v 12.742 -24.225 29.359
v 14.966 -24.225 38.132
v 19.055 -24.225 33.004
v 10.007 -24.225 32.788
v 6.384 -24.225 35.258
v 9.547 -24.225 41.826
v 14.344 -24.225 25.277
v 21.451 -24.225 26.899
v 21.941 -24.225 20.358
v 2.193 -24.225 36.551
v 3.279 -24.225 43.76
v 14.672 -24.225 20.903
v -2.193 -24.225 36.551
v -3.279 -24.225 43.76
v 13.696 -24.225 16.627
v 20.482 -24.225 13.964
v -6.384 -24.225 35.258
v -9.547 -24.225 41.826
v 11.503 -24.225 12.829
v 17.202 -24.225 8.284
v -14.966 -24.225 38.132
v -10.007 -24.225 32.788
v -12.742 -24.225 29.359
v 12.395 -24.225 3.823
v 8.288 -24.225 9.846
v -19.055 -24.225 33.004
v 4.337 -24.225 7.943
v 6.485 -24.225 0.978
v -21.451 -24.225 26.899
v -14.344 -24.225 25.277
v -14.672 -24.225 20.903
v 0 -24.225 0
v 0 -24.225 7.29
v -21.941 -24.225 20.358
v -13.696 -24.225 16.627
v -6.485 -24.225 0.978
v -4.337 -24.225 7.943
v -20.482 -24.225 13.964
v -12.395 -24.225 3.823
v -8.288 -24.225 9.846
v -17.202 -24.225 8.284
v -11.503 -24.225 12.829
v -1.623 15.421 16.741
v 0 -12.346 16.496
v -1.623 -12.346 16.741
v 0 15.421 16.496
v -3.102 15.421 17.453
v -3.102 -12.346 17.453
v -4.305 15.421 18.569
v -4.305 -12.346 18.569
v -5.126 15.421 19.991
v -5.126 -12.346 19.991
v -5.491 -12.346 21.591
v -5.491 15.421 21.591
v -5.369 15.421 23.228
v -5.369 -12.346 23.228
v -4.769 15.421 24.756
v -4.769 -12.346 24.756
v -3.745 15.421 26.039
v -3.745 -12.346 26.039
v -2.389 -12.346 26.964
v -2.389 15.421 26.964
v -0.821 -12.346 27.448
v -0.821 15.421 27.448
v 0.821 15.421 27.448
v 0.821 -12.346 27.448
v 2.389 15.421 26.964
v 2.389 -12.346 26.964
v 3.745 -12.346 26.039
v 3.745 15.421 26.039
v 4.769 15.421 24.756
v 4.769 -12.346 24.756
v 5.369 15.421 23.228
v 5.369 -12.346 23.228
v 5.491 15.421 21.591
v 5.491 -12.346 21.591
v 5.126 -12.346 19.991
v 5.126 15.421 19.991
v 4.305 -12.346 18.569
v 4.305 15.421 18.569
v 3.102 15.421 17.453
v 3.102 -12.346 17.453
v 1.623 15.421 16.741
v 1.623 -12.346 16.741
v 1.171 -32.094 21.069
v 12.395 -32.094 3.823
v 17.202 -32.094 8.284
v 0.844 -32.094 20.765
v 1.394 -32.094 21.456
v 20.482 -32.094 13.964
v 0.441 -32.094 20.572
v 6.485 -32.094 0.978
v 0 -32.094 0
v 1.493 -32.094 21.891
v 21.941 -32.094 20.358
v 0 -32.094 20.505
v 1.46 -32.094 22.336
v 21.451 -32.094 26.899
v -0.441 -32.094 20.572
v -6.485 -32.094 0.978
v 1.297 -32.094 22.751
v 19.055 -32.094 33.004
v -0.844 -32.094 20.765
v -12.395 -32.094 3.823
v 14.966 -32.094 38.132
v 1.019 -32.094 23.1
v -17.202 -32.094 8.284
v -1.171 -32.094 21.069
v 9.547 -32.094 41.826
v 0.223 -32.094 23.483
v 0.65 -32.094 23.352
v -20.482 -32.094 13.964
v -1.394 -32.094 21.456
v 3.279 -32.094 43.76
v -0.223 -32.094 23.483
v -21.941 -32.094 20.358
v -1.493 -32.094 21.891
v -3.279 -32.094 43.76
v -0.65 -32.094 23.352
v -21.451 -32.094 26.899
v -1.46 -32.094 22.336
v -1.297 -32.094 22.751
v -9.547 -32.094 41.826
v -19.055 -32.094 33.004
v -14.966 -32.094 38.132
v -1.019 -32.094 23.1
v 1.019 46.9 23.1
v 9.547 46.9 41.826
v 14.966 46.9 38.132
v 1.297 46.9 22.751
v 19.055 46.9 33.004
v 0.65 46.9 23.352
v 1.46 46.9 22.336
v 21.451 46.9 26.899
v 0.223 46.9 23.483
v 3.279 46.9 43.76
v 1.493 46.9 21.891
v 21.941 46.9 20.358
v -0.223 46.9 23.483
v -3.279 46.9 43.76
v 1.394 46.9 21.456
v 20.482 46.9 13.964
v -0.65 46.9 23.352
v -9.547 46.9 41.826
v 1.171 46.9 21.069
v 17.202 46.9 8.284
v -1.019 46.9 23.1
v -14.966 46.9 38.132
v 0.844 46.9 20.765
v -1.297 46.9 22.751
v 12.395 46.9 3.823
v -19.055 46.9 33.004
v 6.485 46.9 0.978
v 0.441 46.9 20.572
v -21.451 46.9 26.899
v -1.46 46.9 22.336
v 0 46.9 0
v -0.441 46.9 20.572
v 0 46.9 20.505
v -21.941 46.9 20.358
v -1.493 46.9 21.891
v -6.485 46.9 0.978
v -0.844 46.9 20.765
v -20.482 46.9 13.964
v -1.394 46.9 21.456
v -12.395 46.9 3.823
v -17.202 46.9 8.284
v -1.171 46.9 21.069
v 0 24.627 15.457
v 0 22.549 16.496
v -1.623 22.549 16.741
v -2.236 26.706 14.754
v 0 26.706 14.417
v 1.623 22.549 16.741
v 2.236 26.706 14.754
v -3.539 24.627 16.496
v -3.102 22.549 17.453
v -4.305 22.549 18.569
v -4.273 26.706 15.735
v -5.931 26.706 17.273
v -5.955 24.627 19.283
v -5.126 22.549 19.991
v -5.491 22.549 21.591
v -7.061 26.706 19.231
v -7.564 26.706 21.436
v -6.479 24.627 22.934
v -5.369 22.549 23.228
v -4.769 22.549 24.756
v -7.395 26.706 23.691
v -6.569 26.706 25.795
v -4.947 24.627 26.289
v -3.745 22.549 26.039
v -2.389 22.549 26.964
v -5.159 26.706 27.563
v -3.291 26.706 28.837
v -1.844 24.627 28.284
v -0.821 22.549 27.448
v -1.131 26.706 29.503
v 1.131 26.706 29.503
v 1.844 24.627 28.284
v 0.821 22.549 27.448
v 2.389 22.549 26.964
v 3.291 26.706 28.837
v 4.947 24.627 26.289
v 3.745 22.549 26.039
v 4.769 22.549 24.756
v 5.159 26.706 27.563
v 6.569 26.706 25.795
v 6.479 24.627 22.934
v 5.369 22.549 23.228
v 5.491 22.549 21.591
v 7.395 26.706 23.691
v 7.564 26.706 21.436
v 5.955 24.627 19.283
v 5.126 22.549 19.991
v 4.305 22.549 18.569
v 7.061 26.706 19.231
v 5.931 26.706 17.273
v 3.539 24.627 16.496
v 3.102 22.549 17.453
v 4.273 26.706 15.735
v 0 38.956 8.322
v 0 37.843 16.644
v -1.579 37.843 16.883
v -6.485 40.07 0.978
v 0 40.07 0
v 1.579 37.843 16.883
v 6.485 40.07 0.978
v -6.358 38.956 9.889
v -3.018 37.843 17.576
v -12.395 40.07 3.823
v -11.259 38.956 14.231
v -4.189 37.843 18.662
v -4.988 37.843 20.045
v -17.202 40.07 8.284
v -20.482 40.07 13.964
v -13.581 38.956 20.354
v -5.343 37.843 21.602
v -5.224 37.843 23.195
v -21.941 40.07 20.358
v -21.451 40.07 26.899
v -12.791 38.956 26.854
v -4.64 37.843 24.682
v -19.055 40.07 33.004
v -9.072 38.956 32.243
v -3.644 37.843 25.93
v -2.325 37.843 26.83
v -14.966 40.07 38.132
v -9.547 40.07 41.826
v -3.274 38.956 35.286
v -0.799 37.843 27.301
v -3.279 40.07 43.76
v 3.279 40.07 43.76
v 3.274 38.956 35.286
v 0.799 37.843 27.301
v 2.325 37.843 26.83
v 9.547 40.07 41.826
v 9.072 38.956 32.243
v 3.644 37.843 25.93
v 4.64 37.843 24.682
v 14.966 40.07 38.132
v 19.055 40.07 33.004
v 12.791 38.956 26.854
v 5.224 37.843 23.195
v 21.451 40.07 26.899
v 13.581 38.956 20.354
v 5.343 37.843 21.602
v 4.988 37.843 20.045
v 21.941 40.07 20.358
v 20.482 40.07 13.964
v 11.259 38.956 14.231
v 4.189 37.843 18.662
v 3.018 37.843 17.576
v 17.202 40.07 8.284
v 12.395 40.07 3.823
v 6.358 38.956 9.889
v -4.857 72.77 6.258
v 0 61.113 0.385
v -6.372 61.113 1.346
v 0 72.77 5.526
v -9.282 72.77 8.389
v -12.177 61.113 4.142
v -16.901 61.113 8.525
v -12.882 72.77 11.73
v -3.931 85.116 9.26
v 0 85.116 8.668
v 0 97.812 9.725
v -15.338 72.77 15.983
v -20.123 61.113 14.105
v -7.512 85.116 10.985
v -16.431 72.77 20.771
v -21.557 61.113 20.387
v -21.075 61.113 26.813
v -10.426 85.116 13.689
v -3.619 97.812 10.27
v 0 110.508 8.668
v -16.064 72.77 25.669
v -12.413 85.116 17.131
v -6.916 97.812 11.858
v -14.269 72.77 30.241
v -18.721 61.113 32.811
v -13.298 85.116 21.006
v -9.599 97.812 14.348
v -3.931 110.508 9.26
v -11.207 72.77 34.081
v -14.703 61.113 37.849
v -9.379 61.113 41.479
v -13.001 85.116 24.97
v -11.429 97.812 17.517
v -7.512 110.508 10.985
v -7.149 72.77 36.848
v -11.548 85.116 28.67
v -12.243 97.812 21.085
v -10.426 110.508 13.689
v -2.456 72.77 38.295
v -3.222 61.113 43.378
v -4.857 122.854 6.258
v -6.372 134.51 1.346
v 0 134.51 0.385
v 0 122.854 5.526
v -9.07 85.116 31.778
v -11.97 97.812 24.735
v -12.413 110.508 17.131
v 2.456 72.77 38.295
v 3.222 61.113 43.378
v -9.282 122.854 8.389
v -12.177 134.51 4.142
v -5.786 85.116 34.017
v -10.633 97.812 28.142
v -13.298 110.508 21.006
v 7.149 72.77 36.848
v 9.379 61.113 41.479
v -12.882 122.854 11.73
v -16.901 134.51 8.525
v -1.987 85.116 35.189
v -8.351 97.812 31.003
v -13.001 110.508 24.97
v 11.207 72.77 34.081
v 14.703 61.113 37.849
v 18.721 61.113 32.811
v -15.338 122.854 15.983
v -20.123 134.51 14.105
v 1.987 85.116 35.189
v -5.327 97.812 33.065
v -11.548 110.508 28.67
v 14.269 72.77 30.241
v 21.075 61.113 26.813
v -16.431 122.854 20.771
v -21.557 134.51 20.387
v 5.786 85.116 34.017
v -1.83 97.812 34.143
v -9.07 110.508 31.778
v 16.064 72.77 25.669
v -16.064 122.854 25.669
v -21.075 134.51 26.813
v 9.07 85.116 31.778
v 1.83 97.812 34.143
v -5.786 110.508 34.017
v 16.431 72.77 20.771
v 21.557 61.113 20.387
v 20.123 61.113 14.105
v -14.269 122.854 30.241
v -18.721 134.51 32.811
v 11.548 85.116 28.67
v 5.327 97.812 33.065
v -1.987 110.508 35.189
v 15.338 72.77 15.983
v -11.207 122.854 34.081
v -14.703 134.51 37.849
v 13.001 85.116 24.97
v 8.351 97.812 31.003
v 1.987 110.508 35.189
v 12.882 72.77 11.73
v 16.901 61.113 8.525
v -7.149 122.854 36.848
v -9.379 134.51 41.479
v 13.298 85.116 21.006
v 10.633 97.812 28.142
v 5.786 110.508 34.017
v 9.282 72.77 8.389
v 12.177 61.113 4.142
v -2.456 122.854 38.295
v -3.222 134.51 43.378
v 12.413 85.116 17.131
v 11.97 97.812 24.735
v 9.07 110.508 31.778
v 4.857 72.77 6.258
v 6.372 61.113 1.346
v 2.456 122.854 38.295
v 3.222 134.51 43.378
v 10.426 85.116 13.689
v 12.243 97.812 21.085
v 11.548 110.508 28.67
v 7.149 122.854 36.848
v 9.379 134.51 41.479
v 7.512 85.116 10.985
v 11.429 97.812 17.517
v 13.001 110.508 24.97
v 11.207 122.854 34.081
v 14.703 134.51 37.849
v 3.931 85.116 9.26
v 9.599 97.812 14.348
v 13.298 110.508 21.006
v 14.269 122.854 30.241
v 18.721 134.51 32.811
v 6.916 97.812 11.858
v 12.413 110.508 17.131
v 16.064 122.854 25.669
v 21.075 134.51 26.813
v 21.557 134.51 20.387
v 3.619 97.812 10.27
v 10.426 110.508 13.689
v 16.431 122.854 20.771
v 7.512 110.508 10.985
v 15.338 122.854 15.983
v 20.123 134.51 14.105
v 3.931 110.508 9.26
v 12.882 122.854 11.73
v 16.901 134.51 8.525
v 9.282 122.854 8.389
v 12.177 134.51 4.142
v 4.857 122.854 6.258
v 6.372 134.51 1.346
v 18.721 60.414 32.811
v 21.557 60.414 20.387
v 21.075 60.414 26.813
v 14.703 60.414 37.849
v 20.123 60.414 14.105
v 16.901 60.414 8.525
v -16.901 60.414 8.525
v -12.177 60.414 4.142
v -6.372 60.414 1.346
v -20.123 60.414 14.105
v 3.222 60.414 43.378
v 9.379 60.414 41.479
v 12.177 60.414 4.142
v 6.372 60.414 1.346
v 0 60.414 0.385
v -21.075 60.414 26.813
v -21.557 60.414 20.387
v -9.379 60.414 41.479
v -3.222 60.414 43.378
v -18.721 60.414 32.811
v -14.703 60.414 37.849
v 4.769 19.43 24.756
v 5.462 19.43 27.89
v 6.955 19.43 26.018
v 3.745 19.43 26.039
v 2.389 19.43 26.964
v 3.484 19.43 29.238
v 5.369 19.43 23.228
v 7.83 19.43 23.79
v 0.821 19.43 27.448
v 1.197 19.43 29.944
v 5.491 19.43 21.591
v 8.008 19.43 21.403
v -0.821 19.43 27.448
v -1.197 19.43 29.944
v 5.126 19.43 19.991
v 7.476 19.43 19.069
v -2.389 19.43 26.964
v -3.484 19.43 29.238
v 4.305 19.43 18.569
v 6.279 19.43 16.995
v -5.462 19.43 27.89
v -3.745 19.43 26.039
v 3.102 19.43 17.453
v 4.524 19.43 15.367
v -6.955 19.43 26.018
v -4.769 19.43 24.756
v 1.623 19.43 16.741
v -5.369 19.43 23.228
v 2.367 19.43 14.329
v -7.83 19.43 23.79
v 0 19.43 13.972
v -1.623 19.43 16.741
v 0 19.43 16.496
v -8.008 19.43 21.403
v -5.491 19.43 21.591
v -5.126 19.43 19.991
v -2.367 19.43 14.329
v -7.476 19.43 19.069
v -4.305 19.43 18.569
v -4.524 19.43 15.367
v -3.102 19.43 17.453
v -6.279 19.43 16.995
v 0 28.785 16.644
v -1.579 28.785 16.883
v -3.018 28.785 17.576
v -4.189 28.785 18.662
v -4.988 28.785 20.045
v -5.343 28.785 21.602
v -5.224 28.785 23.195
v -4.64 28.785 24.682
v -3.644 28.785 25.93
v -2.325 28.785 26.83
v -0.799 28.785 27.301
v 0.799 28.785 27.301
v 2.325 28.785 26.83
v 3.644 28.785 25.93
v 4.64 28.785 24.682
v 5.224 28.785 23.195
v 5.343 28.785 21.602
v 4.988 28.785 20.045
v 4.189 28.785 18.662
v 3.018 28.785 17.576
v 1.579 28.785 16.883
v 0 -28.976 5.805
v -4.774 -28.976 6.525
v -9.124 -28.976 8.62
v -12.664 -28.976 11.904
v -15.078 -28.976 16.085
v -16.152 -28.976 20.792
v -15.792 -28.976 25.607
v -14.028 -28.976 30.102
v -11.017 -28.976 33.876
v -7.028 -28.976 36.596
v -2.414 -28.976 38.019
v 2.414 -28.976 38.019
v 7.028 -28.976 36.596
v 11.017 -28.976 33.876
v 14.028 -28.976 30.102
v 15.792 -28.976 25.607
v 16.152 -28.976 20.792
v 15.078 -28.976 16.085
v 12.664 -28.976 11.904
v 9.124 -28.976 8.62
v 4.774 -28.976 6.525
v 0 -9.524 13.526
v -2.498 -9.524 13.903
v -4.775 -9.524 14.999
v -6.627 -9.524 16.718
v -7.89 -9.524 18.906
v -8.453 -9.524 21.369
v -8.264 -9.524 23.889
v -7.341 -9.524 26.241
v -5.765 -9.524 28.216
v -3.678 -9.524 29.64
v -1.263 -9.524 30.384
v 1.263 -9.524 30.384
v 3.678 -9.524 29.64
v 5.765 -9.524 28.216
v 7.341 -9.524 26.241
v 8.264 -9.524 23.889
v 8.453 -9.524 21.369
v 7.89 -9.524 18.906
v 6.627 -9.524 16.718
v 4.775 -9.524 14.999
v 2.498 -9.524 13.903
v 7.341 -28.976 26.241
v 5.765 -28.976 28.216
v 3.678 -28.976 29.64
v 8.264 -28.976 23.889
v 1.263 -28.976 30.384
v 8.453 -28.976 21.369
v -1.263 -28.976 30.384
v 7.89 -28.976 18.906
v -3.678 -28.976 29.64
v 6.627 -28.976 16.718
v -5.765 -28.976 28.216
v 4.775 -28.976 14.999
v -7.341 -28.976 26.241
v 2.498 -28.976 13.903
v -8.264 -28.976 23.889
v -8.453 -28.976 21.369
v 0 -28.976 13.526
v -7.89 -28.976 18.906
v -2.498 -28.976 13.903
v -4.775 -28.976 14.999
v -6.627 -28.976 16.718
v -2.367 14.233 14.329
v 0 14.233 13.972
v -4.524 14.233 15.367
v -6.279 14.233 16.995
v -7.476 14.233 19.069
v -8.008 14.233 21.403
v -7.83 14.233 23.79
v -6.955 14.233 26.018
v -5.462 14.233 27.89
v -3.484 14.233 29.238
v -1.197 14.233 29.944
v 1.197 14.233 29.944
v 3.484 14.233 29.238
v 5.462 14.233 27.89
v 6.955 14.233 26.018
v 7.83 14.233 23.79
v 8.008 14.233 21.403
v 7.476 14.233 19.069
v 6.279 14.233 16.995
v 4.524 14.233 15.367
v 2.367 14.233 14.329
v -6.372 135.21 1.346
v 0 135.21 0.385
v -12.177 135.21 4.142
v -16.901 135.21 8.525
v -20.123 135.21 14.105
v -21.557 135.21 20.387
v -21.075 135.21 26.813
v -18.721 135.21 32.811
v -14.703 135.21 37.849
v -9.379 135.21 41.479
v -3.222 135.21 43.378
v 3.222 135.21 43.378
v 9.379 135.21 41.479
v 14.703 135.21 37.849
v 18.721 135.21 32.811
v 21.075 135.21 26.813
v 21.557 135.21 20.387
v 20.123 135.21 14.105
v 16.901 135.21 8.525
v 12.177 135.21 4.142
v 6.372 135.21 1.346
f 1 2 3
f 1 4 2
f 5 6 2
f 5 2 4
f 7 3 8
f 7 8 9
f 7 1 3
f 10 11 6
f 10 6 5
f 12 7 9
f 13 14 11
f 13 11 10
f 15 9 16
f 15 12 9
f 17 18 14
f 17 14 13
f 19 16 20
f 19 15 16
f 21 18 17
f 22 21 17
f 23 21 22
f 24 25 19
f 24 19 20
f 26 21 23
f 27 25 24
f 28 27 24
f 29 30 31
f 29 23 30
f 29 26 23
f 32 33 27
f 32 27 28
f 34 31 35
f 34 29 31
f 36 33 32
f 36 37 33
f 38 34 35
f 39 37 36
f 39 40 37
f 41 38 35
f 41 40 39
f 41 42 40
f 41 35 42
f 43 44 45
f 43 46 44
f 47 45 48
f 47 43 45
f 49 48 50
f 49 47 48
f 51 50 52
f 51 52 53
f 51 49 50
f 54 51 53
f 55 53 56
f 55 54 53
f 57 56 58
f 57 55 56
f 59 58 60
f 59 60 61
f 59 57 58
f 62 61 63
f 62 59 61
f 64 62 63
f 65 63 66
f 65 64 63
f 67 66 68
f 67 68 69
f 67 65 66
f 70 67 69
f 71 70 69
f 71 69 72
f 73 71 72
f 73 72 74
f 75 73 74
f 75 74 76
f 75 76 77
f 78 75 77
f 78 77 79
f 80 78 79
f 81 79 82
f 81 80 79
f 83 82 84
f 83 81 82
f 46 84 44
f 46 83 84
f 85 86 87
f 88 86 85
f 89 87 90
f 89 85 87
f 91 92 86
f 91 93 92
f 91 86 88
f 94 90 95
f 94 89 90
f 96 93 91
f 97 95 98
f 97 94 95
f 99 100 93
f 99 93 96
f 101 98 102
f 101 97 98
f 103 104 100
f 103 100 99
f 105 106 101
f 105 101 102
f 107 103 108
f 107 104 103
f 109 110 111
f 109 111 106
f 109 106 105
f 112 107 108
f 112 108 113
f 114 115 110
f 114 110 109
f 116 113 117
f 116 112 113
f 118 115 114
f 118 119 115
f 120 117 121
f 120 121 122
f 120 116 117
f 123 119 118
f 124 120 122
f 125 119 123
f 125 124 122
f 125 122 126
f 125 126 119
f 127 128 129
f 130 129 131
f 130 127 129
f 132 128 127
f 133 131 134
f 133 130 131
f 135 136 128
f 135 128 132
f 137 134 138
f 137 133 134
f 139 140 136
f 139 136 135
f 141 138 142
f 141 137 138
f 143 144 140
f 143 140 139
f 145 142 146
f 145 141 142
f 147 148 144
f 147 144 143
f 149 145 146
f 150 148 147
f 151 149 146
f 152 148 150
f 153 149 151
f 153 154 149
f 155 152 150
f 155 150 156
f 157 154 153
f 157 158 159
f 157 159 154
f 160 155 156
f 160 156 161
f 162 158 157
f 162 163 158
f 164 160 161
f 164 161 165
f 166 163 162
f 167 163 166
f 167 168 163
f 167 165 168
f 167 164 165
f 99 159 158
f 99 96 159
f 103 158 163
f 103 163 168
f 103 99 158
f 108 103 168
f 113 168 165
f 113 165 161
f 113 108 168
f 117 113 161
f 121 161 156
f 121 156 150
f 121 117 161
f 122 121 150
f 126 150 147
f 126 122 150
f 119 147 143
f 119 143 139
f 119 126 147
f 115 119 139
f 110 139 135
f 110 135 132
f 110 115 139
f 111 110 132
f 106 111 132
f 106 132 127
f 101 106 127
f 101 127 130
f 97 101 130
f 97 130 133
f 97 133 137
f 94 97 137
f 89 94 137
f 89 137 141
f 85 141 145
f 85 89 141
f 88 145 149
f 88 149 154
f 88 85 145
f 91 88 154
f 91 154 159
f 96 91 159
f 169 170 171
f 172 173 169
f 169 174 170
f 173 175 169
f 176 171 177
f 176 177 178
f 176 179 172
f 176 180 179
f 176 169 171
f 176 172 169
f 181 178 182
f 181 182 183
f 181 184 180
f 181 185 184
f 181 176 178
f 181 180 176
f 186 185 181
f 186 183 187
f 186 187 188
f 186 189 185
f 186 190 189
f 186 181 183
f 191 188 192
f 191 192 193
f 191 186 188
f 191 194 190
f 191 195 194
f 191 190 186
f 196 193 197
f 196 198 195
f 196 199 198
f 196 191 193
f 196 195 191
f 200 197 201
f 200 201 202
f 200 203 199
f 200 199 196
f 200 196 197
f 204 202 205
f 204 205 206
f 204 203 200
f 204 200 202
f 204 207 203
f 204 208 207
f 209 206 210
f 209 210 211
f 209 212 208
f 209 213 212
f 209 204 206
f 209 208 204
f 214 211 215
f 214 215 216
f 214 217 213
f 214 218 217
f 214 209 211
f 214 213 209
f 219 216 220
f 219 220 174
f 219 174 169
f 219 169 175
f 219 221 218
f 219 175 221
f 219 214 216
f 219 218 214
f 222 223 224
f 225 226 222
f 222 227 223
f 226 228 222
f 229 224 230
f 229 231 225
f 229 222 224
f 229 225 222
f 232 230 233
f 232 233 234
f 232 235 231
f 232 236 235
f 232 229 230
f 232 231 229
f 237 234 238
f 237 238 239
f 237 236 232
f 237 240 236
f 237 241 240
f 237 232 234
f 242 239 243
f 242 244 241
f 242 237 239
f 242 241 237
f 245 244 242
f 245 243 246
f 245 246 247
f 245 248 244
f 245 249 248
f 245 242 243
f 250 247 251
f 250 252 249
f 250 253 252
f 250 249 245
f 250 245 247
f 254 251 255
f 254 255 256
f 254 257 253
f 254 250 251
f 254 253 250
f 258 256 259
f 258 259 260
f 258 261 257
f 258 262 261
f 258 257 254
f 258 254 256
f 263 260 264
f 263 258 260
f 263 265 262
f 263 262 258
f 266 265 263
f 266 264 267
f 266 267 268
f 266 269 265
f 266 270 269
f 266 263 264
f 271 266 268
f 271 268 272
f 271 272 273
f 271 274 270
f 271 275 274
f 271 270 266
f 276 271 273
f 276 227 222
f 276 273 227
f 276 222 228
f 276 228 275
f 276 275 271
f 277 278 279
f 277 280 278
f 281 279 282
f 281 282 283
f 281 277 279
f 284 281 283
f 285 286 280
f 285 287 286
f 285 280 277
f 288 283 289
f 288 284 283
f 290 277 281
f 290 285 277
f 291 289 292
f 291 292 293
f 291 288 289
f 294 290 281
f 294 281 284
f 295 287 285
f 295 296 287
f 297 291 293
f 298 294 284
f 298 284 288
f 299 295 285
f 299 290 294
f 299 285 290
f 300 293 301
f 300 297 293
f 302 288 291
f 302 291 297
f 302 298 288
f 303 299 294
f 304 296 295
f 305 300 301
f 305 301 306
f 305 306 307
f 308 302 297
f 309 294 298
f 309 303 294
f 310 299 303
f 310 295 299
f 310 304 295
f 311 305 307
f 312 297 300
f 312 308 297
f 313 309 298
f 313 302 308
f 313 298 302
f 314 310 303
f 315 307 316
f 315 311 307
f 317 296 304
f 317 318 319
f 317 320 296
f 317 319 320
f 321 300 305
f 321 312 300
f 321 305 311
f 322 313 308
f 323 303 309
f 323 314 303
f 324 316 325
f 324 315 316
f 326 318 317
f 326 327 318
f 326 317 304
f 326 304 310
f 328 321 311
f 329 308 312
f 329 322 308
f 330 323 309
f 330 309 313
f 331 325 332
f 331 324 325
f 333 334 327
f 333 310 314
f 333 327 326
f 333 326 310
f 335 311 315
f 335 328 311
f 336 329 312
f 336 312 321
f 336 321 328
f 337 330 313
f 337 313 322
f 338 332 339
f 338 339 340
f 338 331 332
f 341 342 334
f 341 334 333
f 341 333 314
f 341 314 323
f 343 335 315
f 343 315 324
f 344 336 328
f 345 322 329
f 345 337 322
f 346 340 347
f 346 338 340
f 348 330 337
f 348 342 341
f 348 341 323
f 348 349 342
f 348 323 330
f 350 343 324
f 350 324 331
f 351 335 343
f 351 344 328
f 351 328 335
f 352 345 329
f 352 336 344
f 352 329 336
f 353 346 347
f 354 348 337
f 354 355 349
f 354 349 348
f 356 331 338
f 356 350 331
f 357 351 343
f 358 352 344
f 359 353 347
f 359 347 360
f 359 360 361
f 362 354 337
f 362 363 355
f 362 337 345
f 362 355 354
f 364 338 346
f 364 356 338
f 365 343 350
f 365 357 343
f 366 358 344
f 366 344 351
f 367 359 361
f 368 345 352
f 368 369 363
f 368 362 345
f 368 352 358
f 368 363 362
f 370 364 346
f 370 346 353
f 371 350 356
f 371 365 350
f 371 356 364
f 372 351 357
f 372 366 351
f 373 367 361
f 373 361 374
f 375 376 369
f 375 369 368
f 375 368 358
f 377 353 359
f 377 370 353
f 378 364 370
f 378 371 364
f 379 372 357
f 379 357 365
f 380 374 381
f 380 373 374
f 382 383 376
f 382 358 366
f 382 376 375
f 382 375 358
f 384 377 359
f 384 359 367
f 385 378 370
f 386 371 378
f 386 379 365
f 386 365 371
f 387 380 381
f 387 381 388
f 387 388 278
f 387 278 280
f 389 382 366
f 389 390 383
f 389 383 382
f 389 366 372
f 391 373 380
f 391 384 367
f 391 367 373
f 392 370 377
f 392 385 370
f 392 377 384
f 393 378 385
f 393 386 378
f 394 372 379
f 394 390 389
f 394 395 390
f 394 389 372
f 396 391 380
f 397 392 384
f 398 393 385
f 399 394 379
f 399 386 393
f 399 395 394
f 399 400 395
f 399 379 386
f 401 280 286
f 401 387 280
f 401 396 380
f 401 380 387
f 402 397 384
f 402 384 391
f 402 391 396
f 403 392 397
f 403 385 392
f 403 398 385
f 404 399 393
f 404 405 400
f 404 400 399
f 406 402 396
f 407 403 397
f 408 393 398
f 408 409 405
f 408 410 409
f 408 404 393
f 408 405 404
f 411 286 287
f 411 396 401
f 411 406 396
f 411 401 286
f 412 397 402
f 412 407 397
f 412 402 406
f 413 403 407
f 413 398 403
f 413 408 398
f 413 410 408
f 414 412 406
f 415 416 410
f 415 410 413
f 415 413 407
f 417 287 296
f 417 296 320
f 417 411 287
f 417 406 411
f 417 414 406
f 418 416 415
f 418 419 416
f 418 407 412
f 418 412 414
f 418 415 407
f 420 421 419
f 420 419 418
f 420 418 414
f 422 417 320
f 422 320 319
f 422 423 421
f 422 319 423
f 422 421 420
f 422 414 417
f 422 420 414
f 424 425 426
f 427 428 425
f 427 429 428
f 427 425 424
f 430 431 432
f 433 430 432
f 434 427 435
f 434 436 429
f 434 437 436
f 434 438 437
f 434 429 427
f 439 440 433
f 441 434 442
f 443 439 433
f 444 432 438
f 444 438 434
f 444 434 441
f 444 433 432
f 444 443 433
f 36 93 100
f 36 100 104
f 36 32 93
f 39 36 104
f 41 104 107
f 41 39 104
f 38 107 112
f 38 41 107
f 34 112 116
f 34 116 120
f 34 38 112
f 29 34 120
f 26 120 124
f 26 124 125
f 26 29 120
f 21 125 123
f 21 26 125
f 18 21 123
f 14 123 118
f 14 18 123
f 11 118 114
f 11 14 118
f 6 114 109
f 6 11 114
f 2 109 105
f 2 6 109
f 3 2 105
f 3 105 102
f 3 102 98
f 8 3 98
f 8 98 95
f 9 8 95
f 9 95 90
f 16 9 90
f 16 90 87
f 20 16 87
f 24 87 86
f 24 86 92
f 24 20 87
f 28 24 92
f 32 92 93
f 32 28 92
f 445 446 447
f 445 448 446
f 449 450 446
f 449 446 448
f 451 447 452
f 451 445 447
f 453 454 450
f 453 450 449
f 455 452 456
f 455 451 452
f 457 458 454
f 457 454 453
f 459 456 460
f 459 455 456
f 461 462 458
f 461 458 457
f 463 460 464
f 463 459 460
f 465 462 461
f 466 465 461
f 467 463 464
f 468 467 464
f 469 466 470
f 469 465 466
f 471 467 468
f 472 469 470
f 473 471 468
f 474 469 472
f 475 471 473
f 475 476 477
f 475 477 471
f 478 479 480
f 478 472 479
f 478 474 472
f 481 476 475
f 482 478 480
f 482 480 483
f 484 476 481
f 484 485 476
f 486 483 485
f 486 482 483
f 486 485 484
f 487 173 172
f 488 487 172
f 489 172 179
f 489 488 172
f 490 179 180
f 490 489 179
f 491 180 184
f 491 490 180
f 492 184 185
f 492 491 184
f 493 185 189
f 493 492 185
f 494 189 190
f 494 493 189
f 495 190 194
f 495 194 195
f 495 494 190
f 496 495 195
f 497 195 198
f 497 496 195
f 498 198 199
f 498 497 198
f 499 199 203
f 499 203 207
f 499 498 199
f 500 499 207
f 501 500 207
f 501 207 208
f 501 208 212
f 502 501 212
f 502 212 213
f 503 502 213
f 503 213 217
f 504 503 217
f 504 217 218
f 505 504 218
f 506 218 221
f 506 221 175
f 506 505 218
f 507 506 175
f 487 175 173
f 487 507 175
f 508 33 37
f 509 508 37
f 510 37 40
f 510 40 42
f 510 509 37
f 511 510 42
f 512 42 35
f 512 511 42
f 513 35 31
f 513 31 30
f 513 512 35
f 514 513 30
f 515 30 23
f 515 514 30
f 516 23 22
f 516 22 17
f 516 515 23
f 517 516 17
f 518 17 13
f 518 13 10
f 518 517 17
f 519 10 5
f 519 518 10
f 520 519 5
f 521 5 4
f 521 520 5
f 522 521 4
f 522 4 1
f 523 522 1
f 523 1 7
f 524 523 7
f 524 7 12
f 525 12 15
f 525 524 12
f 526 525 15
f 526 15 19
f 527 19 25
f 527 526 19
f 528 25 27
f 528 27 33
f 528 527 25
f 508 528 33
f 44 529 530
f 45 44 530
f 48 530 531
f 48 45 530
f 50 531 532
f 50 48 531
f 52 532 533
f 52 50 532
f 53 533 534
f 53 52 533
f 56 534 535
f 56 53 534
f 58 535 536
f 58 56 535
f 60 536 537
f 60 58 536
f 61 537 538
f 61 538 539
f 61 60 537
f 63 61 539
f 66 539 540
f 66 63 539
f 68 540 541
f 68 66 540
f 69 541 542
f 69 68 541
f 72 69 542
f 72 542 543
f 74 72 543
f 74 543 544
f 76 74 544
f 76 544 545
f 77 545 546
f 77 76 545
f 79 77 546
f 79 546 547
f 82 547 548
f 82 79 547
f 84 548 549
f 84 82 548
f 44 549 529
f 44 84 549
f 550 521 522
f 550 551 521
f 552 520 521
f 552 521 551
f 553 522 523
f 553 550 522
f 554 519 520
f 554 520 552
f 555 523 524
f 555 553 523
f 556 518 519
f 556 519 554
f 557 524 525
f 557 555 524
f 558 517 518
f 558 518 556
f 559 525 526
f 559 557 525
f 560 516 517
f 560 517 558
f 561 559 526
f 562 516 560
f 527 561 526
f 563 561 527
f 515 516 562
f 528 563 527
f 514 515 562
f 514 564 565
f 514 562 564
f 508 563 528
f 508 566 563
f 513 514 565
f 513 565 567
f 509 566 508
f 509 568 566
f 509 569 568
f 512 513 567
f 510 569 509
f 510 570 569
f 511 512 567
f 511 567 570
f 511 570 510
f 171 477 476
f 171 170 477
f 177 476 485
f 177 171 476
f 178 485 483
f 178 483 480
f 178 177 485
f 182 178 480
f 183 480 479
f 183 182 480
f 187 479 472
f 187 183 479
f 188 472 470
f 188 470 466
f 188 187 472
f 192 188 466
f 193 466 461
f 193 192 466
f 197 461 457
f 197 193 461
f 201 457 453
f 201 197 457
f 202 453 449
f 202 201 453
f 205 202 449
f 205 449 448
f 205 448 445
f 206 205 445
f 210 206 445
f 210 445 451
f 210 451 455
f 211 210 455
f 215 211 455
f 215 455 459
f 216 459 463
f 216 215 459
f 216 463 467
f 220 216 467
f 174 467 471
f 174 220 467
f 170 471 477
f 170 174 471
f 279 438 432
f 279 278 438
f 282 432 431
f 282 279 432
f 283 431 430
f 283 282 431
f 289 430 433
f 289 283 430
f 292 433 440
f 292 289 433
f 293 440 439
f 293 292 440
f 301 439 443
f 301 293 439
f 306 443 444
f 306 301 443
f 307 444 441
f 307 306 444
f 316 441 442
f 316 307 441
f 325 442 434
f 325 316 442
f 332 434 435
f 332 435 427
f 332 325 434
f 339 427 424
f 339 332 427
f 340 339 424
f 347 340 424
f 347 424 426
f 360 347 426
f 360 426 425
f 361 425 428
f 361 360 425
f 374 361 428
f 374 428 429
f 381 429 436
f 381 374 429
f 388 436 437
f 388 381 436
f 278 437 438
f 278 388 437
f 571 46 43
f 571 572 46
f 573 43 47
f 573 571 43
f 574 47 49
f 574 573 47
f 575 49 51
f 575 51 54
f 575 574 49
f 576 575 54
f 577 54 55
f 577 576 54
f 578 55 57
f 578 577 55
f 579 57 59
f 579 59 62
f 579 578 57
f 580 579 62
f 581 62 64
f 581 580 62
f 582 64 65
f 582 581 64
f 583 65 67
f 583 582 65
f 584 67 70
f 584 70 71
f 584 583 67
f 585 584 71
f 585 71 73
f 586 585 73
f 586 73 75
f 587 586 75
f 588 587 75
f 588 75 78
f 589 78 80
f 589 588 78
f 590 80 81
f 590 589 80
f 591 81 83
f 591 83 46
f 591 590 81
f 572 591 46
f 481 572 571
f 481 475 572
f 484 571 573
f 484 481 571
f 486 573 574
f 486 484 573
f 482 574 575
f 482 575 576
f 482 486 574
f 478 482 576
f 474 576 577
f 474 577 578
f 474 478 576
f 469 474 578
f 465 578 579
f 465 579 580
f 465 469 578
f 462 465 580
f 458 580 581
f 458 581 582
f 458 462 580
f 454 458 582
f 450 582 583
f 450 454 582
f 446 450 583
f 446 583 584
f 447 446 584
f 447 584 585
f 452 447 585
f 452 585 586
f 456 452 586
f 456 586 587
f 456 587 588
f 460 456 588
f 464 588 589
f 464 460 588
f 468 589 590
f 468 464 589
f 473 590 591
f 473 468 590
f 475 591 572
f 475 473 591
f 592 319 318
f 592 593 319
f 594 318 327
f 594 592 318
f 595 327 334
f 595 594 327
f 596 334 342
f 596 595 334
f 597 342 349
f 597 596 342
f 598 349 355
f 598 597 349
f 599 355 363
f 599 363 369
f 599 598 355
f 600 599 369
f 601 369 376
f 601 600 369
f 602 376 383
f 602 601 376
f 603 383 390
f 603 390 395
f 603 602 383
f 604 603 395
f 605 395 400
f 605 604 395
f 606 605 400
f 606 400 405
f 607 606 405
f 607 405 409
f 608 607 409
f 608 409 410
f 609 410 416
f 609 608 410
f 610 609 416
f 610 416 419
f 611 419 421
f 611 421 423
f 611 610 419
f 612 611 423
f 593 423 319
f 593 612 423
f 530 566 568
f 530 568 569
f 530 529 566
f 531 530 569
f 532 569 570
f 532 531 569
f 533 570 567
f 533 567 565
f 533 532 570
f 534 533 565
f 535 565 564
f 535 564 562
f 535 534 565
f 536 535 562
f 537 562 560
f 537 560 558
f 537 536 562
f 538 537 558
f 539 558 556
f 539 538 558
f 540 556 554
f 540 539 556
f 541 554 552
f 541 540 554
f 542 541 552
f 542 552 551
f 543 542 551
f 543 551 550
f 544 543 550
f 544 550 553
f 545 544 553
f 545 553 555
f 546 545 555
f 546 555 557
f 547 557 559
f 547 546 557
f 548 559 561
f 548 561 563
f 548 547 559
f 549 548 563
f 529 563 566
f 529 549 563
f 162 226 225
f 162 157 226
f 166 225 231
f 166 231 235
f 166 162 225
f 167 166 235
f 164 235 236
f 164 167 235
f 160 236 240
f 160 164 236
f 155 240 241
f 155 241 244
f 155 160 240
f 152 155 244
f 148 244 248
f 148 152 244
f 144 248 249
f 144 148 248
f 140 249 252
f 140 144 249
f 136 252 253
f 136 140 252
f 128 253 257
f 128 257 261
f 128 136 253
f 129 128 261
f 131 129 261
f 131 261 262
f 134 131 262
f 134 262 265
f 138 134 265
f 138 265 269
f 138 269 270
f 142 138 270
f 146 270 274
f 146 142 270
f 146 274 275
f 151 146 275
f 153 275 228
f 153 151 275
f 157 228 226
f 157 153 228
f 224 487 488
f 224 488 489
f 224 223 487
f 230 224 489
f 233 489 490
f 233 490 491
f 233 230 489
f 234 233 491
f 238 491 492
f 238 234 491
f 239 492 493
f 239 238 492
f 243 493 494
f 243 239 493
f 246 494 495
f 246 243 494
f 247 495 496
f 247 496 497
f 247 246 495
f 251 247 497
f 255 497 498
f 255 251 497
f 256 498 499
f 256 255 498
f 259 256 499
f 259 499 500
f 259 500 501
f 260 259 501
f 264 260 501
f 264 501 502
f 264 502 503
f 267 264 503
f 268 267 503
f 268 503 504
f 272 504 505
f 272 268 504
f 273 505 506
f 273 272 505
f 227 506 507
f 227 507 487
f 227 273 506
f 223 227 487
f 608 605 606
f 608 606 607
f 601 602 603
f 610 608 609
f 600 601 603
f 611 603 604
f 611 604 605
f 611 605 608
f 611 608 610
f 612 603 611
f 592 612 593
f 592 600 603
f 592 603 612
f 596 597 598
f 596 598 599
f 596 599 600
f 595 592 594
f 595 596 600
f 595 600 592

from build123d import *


with BuildPart() as f1:
    # F0 (on Right) → F1 (revolve)
    with BuildSketch(Plane.YZ):
        Polygon((-32.094423, 20.505153), (-32.094423, 0), (-24.224635, 0), (-24.224635, 7.289845), (-28.976208, 5.804979), (-28.976208, 13.526282), (-9.524463, 13.526282), (-12.345708, 16.496014), (15.421285, 16.496014), (14.233393, 13.971742), (19.430423, 13.971742), (19.430423, 16.496014), (22.548644, 16.496014), (26.706267, 14.417202), (28.785078, 16.6445), (37.842762, 16.6445), (40.070061, 0), (46.90044, 0), (46.90044, 20.505153), align=None)
        with BuildLine():
            ThreePointArc((61.113427, 0.385497), (97.811922, 9.724847), (134.510418, 0.385497))
            Line((134.510418, 0.385497), (135.210066, 0.385497))
            Line((135.210066, 0.385497), (135.210066, 22.002673))
            Line((135.210066, 22.002673), (60.413779, 22.002673))
            Line((60.413779, 22.002673), (60.413779, 0.385497))
            Line((60.413779, 0.385497), (61.113427, 0.385497))
        make_face()
    revolve(axis=Axis((0, 97.811922, 22.002673), (0, 1, 0)))


solid = f1.part
